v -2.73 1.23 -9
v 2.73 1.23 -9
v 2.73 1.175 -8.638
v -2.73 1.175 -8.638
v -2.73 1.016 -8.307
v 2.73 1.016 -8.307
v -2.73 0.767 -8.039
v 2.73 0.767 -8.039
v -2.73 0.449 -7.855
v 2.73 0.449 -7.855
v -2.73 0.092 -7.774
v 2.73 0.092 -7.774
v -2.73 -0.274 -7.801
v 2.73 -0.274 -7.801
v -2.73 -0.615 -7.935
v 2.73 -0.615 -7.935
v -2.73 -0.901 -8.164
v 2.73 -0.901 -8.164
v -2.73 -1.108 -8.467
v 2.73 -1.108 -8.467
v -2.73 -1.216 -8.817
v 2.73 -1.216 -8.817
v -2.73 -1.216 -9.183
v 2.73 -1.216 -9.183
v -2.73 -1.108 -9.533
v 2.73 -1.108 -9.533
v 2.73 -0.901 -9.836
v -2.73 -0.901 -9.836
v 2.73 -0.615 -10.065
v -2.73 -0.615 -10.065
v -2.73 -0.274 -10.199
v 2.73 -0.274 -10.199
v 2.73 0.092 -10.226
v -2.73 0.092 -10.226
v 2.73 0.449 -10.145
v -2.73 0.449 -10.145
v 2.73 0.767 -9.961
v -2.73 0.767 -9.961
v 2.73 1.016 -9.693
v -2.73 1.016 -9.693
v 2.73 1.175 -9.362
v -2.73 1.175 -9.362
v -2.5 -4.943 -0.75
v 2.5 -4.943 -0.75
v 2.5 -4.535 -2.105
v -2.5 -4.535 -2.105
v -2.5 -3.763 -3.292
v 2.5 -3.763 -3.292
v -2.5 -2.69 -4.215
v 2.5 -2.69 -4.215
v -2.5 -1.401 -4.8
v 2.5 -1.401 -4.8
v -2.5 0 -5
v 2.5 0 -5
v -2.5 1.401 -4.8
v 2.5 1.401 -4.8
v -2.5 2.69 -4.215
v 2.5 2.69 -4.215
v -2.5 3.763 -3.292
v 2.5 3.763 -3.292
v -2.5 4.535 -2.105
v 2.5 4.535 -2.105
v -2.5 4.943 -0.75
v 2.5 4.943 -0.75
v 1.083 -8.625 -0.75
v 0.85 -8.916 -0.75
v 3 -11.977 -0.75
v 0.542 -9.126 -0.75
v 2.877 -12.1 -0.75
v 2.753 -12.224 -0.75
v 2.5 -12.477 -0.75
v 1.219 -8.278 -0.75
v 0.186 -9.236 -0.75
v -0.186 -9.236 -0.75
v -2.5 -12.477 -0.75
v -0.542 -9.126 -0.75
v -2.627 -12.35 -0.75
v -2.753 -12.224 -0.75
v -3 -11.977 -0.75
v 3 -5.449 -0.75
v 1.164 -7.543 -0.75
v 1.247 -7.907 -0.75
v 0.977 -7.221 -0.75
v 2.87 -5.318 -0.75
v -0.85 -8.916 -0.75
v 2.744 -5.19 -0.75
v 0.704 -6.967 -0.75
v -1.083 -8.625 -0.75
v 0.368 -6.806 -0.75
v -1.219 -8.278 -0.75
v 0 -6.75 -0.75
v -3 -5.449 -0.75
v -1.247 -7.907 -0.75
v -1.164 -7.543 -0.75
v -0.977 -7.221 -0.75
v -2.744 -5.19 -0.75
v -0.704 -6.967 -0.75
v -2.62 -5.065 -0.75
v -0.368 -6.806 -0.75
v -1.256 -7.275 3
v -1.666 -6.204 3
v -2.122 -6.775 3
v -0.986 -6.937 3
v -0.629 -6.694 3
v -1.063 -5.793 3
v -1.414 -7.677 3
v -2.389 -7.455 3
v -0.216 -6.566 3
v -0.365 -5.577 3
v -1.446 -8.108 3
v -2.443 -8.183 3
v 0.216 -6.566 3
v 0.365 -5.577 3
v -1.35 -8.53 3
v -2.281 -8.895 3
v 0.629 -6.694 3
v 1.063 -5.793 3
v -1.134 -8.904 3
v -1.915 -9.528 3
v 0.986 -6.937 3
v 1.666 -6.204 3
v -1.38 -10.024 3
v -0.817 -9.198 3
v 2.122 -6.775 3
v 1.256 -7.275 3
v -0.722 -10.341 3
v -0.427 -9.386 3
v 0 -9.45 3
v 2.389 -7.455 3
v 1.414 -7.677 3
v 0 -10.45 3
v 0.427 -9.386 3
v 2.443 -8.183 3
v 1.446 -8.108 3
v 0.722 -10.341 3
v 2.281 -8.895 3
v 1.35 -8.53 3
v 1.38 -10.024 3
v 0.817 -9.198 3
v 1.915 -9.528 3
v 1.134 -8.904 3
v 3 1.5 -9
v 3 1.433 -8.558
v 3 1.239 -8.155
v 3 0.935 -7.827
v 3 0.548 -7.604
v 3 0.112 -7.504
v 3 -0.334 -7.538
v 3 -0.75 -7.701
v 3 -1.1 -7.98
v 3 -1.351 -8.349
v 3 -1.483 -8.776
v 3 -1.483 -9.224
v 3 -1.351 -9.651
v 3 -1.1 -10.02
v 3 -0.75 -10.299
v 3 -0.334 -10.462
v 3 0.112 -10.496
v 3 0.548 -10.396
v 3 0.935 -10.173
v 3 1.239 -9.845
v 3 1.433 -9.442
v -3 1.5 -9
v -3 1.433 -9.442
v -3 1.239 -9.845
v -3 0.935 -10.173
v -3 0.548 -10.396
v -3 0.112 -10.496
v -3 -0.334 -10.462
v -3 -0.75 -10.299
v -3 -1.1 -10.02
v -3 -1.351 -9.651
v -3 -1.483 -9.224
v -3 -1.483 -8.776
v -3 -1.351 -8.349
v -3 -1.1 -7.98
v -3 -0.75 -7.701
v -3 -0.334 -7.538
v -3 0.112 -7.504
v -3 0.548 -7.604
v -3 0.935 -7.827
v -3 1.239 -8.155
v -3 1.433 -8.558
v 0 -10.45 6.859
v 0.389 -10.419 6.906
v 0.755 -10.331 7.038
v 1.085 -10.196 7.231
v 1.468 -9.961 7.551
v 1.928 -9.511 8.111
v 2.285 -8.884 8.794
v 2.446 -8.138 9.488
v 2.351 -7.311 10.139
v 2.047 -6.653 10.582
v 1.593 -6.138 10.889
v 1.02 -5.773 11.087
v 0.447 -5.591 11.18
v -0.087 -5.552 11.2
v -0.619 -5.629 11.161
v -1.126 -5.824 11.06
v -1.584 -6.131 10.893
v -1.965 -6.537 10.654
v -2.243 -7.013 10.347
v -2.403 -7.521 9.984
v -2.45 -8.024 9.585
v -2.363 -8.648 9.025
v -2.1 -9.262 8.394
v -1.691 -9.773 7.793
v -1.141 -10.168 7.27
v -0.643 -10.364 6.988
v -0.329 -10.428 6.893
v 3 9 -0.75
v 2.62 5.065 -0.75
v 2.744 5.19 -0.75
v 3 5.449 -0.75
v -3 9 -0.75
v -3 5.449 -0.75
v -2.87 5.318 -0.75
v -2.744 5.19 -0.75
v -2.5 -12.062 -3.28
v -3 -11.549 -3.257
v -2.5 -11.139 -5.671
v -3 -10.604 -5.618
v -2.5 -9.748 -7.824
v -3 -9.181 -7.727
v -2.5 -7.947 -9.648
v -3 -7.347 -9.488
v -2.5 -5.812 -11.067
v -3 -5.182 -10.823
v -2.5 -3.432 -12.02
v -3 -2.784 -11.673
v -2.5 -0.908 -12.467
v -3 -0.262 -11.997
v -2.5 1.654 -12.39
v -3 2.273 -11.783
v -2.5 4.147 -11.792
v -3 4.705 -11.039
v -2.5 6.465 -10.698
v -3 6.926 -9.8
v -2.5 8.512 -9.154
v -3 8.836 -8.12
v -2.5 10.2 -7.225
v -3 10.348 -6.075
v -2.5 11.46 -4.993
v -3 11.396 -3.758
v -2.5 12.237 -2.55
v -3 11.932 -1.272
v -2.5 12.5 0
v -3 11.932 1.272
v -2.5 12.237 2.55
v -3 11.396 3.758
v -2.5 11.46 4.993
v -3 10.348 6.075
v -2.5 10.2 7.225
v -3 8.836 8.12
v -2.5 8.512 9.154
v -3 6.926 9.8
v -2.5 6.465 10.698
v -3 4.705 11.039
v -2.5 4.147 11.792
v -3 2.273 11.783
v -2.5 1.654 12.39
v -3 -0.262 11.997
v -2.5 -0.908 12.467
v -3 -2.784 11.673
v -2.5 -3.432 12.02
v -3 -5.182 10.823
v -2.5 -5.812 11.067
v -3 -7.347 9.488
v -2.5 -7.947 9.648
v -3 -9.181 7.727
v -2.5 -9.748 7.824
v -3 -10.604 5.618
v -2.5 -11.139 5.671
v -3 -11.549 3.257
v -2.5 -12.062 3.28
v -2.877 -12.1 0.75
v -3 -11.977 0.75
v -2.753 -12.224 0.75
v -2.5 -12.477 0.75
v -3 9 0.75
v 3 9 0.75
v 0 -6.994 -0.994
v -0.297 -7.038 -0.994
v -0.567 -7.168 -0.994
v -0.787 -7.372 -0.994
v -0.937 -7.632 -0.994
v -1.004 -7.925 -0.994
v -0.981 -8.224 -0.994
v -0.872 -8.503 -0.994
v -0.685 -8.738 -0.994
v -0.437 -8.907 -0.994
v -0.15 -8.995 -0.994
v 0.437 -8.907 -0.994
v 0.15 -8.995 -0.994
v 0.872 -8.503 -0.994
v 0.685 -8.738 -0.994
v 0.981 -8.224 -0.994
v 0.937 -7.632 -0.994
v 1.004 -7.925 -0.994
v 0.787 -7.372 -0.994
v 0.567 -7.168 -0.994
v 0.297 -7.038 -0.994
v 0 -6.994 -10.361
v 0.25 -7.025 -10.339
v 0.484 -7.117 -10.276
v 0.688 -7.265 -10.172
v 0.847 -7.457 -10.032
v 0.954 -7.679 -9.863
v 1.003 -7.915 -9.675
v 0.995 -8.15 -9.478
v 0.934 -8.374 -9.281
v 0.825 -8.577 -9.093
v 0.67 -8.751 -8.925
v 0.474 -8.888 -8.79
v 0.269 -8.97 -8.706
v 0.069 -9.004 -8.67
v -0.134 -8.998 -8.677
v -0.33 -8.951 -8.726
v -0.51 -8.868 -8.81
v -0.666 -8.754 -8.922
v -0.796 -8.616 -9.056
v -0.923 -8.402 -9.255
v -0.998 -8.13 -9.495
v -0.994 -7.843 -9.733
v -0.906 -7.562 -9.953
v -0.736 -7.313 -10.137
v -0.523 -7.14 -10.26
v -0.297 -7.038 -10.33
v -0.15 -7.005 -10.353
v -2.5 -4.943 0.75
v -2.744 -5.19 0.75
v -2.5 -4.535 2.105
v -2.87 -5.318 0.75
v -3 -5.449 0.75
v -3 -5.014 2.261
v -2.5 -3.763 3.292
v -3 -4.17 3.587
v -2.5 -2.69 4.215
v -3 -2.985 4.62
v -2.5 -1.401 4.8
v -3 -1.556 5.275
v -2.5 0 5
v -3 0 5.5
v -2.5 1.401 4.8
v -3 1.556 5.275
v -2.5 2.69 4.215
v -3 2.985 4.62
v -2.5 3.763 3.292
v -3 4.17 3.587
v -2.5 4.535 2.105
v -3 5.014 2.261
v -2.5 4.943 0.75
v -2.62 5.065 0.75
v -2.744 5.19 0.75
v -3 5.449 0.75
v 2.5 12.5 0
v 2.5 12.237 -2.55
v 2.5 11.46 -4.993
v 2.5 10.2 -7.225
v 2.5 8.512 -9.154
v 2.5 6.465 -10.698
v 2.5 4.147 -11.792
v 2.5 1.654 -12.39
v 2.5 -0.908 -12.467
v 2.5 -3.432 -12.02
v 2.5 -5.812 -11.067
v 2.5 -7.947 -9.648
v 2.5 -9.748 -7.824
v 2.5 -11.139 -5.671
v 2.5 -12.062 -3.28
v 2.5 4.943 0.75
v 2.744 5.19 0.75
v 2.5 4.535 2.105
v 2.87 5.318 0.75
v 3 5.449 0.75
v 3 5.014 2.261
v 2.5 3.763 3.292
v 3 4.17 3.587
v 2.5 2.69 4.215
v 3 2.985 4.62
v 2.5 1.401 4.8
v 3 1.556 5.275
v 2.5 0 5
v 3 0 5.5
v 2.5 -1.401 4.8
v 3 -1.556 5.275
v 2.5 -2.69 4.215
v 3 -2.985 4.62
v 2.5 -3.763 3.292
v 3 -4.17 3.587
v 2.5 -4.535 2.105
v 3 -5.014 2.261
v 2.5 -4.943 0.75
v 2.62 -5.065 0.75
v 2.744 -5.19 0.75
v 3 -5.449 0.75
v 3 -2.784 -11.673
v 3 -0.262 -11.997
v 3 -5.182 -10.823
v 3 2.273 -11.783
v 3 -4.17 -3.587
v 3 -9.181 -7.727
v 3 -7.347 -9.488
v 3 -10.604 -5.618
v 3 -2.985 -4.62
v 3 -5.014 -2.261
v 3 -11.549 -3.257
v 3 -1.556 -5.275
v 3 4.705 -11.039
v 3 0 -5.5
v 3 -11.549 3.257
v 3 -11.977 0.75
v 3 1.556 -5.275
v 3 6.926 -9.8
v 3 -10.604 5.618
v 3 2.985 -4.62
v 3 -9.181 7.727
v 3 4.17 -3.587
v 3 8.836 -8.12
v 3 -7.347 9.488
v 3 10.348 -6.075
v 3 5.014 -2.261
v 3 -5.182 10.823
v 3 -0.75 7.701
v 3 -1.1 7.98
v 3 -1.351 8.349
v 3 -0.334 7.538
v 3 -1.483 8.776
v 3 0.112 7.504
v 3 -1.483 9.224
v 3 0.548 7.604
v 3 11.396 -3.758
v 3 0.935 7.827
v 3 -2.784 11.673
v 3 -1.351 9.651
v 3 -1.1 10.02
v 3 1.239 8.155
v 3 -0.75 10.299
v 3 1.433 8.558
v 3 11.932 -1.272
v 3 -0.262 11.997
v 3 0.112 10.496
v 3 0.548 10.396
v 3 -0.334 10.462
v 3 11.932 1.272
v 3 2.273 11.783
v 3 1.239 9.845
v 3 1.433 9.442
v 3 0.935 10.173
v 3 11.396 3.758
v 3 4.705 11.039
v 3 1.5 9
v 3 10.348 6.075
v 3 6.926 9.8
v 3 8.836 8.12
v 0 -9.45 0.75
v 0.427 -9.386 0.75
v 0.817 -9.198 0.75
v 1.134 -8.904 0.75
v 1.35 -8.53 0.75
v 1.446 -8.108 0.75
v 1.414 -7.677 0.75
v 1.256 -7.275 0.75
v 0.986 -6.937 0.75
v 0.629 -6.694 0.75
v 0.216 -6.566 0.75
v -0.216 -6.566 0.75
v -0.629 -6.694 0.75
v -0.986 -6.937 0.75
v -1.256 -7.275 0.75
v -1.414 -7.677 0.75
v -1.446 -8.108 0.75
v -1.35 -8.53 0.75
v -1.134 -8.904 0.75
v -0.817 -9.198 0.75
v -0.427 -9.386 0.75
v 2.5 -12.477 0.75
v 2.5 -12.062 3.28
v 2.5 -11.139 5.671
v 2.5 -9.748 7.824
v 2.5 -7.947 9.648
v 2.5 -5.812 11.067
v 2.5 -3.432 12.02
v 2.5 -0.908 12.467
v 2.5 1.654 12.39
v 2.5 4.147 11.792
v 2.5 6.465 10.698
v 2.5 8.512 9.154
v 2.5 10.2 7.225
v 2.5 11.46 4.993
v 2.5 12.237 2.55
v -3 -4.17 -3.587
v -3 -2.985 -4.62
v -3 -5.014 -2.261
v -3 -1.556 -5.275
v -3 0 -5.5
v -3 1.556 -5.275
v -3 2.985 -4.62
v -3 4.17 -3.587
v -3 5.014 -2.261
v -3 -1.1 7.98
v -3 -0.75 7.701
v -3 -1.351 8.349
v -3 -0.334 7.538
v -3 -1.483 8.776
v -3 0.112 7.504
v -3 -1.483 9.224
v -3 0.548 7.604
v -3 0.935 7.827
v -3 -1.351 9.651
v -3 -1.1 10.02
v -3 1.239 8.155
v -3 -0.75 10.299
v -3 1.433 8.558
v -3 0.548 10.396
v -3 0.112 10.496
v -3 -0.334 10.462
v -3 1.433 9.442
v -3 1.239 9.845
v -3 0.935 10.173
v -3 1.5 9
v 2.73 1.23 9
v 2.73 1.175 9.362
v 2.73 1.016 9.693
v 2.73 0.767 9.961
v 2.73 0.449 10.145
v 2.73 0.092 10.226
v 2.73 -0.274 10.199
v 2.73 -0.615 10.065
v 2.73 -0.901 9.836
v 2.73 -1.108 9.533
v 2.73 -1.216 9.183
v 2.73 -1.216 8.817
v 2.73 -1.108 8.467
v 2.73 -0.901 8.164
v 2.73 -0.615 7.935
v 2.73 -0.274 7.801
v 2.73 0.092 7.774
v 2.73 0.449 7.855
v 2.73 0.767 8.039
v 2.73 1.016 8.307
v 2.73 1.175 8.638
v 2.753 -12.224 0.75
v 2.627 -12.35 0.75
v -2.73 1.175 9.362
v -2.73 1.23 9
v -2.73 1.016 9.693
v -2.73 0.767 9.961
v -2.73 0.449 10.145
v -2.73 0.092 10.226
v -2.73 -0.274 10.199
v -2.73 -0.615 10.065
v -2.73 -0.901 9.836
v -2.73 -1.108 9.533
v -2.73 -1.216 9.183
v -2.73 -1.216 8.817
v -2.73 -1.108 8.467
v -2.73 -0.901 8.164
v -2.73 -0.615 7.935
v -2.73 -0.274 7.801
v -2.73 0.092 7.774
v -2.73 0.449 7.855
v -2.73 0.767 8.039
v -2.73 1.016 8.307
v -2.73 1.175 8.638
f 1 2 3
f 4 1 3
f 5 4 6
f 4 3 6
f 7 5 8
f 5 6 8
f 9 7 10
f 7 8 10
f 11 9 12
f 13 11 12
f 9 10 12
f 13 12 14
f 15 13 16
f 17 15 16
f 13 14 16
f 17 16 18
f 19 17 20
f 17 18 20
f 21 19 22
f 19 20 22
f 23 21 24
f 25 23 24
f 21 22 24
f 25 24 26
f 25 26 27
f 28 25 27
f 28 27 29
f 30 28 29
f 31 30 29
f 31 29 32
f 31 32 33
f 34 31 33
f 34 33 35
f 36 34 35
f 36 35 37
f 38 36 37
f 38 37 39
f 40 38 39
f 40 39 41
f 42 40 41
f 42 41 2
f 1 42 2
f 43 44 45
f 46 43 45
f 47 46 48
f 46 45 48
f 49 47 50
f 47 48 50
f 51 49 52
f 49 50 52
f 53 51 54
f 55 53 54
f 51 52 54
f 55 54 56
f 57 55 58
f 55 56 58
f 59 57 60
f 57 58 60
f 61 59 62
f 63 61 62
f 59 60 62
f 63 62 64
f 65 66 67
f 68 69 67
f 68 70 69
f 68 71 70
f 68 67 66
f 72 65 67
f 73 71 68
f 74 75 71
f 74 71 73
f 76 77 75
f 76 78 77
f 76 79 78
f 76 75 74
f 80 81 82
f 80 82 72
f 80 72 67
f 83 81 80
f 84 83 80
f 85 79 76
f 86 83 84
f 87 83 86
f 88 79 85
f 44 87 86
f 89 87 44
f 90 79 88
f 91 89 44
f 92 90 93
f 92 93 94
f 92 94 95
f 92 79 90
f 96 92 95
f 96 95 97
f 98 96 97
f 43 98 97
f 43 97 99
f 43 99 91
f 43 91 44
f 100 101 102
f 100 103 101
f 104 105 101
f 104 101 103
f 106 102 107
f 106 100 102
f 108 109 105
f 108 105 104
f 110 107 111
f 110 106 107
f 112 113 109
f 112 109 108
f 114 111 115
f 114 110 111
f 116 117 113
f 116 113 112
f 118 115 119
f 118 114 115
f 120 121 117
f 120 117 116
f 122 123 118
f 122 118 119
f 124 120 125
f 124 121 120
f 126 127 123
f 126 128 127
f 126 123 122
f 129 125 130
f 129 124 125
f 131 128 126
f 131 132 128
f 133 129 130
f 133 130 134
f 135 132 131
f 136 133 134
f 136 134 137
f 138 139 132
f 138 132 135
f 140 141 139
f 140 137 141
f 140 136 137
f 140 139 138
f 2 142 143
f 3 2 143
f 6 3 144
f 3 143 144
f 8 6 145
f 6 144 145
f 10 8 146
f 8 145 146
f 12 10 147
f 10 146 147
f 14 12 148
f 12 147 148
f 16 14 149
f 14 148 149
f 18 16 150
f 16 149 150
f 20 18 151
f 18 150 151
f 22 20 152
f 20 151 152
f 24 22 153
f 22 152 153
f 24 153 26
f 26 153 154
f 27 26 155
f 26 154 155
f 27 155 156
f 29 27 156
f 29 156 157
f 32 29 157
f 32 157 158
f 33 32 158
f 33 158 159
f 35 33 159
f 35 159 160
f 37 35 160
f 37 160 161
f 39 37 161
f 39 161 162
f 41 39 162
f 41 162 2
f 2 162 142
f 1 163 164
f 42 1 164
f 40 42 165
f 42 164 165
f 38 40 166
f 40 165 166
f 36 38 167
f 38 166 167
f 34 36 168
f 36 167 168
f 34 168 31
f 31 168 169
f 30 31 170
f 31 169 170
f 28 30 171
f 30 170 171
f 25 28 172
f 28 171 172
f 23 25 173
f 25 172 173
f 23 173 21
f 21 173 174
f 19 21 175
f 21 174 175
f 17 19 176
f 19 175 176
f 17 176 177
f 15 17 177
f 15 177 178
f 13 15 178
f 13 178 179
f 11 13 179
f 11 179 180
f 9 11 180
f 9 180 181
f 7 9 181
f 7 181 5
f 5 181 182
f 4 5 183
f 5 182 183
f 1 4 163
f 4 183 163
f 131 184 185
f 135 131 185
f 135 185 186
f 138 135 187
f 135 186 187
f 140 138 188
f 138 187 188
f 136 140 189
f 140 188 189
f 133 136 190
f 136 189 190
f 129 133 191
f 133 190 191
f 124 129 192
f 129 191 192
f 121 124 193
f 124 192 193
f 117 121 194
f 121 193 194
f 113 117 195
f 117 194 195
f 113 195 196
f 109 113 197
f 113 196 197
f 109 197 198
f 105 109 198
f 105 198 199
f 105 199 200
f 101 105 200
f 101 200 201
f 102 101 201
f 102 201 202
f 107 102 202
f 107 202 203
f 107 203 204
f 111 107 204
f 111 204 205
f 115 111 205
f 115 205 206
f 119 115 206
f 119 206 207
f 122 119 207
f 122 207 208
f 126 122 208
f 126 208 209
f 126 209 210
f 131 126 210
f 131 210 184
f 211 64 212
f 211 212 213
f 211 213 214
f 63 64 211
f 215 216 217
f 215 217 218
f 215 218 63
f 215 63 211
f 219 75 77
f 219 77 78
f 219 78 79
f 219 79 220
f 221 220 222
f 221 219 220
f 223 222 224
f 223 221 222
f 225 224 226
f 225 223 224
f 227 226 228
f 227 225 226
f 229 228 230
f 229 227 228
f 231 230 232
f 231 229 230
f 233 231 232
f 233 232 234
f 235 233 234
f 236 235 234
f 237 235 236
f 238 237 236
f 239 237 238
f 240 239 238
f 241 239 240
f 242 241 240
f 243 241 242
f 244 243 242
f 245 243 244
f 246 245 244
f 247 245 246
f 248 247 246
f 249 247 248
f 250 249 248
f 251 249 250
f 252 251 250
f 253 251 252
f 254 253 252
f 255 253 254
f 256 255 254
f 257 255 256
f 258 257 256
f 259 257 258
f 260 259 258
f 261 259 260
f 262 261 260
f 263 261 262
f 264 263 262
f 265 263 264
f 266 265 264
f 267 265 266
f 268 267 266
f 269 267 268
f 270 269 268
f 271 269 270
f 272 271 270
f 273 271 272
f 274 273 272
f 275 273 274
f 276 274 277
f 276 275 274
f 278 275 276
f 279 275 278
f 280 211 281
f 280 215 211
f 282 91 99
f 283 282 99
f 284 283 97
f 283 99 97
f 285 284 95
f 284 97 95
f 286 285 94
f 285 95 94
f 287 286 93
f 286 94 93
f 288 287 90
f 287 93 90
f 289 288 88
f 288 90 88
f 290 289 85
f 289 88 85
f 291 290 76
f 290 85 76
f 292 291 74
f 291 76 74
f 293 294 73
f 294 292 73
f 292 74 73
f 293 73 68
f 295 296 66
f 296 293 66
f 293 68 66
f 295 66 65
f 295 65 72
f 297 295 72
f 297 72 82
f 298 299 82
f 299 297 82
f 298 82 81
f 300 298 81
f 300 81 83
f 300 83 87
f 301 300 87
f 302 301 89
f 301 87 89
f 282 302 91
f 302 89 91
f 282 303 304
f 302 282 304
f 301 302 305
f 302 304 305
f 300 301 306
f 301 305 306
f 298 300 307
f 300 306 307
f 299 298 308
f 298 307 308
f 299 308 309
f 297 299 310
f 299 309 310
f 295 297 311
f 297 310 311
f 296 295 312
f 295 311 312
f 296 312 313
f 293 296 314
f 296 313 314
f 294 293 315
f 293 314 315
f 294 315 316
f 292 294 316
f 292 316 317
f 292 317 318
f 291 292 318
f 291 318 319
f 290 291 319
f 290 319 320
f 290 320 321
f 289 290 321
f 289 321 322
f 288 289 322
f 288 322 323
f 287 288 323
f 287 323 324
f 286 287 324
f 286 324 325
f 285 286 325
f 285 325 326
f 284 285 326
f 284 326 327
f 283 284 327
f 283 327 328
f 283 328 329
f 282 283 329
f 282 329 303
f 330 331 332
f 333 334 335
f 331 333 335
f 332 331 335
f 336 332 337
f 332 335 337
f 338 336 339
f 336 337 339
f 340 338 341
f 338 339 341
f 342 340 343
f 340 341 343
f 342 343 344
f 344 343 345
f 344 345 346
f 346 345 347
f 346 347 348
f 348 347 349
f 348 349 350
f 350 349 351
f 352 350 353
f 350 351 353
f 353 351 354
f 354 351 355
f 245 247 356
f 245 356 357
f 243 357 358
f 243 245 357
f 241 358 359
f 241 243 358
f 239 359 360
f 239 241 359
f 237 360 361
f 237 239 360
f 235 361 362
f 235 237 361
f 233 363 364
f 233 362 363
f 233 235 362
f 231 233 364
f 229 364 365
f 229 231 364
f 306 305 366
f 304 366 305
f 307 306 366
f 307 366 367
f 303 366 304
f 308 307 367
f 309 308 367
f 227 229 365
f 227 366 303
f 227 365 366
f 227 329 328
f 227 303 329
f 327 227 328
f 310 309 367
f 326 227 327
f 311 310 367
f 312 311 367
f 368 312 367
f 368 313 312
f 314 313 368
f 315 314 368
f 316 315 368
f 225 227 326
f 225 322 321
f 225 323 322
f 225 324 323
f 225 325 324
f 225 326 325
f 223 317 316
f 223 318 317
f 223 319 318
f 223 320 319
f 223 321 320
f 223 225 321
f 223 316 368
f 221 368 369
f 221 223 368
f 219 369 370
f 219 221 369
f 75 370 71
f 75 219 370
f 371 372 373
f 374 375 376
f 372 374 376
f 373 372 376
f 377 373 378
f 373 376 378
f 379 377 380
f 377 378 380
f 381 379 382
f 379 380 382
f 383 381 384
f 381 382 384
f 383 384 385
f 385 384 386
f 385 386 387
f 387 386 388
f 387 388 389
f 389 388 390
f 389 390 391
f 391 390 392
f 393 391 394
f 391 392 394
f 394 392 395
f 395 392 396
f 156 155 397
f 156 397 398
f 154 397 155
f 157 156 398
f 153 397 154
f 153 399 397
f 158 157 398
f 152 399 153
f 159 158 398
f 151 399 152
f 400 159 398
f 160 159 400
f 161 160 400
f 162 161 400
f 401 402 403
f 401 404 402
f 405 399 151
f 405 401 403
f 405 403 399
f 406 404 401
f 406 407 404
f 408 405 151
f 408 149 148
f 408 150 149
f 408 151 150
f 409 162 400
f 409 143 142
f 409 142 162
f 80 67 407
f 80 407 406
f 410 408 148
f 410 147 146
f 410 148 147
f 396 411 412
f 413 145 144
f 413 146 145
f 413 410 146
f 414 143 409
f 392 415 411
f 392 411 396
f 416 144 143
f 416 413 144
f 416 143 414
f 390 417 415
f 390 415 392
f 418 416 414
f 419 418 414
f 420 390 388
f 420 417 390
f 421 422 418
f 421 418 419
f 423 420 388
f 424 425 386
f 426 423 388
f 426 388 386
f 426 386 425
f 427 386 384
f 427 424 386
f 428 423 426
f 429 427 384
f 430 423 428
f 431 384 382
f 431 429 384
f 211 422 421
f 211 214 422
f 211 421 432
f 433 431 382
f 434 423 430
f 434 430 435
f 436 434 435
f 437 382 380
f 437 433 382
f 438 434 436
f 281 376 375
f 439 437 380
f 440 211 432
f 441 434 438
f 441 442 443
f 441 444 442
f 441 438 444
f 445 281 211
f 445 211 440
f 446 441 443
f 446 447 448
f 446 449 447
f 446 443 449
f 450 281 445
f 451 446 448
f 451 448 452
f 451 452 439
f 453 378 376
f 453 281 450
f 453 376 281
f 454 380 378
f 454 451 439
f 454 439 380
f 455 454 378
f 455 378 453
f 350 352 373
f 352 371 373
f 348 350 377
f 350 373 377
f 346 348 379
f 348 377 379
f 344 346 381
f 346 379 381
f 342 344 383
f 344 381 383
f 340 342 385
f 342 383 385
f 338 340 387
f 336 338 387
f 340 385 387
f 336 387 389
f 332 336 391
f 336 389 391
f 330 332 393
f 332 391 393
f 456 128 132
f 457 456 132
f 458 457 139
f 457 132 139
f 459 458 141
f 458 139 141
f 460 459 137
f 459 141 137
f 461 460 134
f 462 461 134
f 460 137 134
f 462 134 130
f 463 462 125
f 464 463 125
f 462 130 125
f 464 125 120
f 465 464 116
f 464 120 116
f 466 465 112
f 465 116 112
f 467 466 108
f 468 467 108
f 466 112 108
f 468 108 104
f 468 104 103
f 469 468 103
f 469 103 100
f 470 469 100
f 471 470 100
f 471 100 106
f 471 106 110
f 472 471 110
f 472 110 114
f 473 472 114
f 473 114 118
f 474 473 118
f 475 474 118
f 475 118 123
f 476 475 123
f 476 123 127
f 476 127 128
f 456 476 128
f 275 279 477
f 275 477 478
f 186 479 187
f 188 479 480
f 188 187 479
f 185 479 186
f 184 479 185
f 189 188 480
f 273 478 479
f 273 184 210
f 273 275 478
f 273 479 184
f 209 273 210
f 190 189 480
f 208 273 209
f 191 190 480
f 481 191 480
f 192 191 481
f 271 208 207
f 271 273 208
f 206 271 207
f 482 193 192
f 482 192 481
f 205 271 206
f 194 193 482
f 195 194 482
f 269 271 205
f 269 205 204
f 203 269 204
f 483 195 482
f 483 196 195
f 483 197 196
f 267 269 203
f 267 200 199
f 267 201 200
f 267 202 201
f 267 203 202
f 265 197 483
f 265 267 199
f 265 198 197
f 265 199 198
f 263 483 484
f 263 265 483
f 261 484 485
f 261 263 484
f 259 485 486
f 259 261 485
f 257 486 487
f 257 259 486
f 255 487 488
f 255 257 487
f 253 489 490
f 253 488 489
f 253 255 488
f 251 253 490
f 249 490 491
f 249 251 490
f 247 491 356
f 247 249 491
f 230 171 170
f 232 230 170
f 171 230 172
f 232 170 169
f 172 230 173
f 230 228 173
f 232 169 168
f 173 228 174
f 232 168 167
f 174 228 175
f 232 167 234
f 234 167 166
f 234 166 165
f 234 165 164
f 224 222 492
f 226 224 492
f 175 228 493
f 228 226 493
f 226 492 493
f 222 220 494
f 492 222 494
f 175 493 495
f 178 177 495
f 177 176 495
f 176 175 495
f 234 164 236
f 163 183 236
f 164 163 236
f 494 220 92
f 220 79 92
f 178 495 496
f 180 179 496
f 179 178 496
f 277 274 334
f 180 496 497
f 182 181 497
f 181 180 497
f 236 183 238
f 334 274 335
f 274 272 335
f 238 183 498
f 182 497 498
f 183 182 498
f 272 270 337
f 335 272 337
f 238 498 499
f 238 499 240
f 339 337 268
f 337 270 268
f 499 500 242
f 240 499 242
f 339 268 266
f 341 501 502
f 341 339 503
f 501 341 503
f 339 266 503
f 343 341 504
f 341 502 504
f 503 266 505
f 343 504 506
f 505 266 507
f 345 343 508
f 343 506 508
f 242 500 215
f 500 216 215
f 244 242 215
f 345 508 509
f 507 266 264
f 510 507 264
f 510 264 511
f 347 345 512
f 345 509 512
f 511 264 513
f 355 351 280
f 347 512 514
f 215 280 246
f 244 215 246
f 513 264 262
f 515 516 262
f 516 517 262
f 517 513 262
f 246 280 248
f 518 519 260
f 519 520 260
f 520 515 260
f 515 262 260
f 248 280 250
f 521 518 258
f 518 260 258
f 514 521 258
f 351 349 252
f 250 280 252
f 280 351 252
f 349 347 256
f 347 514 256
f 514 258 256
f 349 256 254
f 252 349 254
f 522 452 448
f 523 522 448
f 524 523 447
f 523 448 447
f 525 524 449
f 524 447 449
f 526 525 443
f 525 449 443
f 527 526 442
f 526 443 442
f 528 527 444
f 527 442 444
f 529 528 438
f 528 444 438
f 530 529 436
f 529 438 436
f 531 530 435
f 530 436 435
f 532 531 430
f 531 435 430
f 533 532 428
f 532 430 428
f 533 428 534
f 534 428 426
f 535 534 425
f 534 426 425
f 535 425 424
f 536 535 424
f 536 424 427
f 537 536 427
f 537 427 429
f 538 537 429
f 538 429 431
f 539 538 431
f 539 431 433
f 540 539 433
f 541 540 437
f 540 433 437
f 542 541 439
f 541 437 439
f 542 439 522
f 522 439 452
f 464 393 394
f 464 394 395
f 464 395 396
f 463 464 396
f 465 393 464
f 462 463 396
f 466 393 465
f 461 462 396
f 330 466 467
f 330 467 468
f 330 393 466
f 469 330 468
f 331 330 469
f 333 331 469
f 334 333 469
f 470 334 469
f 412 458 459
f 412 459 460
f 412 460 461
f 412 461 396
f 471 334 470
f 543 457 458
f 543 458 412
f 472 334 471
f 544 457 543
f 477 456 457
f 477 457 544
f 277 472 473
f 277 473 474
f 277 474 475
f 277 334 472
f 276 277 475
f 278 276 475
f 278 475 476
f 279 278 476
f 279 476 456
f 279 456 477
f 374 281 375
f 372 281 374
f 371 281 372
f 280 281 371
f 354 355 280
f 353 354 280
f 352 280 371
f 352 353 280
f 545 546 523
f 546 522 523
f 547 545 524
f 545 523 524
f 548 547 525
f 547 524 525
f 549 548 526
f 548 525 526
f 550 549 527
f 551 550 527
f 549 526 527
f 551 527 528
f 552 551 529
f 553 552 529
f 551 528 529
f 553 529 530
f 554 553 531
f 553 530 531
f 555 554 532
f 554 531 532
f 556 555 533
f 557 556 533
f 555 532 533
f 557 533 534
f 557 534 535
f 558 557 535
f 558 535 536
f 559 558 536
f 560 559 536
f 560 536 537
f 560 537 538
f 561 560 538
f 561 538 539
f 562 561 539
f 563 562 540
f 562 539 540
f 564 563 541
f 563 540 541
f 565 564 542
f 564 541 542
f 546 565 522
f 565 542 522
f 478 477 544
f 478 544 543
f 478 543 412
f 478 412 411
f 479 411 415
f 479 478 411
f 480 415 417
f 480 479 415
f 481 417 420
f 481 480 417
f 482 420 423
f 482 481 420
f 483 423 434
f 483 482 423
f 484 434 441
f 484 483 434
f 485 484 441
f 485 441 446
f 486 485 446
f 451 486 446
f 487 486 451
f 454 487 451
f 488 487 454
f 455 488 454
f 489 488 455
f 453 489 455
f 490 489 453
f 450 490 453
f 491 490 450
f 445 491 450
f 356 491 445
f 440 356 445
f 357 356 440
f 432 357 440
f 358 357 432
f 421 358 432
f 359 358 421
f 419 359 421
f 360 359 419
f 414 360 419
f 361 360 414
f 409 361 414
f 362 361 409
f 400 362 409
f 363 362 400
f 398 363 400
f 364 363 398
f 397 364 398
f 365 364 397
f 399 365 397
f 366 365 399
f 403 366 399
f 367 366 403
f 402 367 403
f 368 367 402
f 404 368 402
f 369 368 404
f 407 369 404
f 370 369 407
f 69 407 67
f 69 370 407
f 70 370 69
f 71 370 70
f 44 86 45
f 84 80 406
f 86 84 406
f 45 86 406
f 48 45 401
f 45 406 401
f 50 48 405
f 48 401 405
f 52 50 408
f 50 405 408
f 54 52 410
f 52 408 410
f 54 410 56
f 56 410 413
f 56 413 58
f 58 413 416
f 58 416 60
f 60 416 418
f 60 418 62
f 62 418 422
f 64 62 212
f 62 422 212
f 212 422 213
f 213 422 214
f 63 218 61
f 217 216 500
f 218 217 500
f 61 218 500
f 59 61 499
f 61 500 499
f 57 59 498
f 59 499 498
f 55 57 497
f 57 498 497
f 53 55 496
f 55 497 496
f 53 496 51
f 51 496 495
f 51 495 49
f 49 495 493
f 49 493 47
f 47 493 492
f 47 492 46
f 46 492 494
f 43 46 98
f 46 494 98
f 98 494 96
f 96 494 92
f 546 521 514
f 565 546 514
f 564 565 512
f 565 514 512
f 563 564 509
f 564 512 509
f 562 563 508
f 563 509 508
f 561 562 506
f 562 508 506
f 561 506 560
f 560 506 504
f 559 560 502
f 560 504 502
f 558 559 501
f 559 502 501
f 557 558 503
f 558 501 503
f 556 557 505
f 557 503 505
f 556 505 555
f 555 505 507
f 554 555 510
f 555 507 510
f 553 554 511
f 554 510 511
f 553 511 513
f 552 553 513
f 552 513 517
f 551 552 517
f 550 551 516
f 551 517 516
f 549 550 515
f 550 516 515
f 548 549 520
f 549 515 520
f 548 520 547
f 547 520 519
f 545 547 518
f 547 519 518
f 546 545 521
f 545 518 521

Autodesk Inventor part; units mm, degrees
sketch "Sketch_1" plane through (0, 0, 0) normal (0, 0, 1) x (1, 0, 0)
  line L0 (3, 0) -> (-3, 0)
  line L1 (-3, 12) -> (-3, 5.5)
  line L2 (-3, 5.5) -> (-2.5, 5)
  line L3 (-2.5, 5) -> (2.5, 5)
  line L4 (2.5, 5) -> (3, 5.5)
  line L5 (3, 5.5) -> (3, 12)
  line L6 (3, 12) -> (2.5, 12.5)
  line L7 (2.5, 12.5) -> (-2.5, 12.5)
  line L8 (-2.5, 12.5) -> (-3, 12)
revolve "Revolution1" add sketch "Sketch_1" angle 360 about axis through (3, 0, 0) along (1, 0, 0)
sketch "Sketch_2" plane through (0, 0, 0) normal (1, 0, 0) x (0, 1, 0)
  line L0 (-12.5, 0.75) -> (-12.5, -0.75)
  line L1 (-12.5, -0.75) -> (9, -0.75)
  line L2 (9, -0.75) -> (9, 0.75)
  line L3 (9, 0.75) -> (-12.5, 0.75)
extrude "Extrusion1" cut sketch "Sketch_2" along normal mid plane 6
sketch "Sketch_3" plane through (0, 0, 0) normal (1, 0, 0) x (0, 1, 0)
  line L0 (-8, 12.5) -> (-8, 0)
  line L1 (-8, 0) -> (-9.45, 0)
  line L2 (-9.45, 0) -> (-9.45, 3)
  line L3 (-9.45, 3) -> (-10.45, 3)
  line L4 (-10.45, 3) -> (-10.45, 12.5)
  line L5 (-10.45, 12.5) -> (-8, 12.5)
  line L6 (-8, 12.5) -> (-8, 0)
revolve "Revolution2" cut sketch "Sketch_3" angle 360 about axis through (0, -8, 12.5) along (0, 0, 1)
sketch "Sketch_4" plane through (0, 0, 0) normal (1, 0, 0) x (0, 1, 0)
  line L0 (-8, -12.75) -> (-8, -0.75)
  line L1 (-8, -0.75) -> (-6.75, -0.75)
  line L2 (-6.75, -0.75) -> (-6.9935, -0.9935)
  line L3 (-6.9935, -0.9935) -> (-6.9935, -12.75)
  line L4 (-6.9935, -12.75) -> (-8, -12.75)
  line L5 (-8, -12.75) -> (-8, -0.75)
revolve "Revolution3" cut sketch "Sketch_4" angle 360 about axis through (0, -8, -12.75) along (0, 0, -1)
thread "Thread1" size "M2.5x0.45" class "6H" standard "ISO Metric profile" length 9.5273
sketch "Sketch_7" plane through (0, 0, -9) normal (0, 0, 1) x (1, 0, 0)
  line L0 (3, 0) -> (-3, 0)
  line L1 (-3, 0) -> (-3, 1.5)
  line L2 (-3, 1.5) -> (-2.7295, 1.2295)
  line L3 (-2.7295, 1.2295) -> (2.7295, 1.2295)
  line L4 (2.7295, 1.2295) -> (3, 1.5)
  line L5 (3, 1.5) -> (3, 0)
  line L6 (3, 0) -> (-3, 0)
revolve "Revolution4" cut sketch "Sketch_7" angle 360 about axis through (3, 0, -9) along (1, 0, 0)
thread "Thread2" size "M3x0.5" class "6H" standard "ISO Metric profile" full length
sketch "Sketch_8" plane through (0, 0, 9) normal (0, 0, 1) x (1, 0, 0)
  line L0 (3, 0) -> (-3, 0)
  line L1 (-3, 0) -> (-3, 1.5)
  line L2 (-3, 1.5) -> (-2.7295, 1.2295)
  line L3 (-2.7295, 1.2295) -> (2.7295, 1.2295)
  line L4 (2.7295, 1.2295) -> (3, 1.5)
  line L5 (3, 1.5) -> (3, 0)
  line L6 (3, 0) -> (-3, 0)
revolve "Revolution5" cut sketch "Sketch_8" angle 360 about axis through (3, 0, 9) along (1, 0, 0)
thread "Thread3" size "M3x0.5" class "6H" standard "ISO Metric profile" full length
ref_plane "body_screw_XY" through (0, -8, 3) normal (0, 0, 1) x (1, 0, 0)
ref_plane "body_screw_YZ" through (0, -8, 3) normal (1, 0, 0) x (0, 1, 0)
ref_plane "body_screw_ZX" through (0, -8, 3) normal (0, 1, 0) x (0, 0, 1)
properties part number "SCSWJ10-6_b"
